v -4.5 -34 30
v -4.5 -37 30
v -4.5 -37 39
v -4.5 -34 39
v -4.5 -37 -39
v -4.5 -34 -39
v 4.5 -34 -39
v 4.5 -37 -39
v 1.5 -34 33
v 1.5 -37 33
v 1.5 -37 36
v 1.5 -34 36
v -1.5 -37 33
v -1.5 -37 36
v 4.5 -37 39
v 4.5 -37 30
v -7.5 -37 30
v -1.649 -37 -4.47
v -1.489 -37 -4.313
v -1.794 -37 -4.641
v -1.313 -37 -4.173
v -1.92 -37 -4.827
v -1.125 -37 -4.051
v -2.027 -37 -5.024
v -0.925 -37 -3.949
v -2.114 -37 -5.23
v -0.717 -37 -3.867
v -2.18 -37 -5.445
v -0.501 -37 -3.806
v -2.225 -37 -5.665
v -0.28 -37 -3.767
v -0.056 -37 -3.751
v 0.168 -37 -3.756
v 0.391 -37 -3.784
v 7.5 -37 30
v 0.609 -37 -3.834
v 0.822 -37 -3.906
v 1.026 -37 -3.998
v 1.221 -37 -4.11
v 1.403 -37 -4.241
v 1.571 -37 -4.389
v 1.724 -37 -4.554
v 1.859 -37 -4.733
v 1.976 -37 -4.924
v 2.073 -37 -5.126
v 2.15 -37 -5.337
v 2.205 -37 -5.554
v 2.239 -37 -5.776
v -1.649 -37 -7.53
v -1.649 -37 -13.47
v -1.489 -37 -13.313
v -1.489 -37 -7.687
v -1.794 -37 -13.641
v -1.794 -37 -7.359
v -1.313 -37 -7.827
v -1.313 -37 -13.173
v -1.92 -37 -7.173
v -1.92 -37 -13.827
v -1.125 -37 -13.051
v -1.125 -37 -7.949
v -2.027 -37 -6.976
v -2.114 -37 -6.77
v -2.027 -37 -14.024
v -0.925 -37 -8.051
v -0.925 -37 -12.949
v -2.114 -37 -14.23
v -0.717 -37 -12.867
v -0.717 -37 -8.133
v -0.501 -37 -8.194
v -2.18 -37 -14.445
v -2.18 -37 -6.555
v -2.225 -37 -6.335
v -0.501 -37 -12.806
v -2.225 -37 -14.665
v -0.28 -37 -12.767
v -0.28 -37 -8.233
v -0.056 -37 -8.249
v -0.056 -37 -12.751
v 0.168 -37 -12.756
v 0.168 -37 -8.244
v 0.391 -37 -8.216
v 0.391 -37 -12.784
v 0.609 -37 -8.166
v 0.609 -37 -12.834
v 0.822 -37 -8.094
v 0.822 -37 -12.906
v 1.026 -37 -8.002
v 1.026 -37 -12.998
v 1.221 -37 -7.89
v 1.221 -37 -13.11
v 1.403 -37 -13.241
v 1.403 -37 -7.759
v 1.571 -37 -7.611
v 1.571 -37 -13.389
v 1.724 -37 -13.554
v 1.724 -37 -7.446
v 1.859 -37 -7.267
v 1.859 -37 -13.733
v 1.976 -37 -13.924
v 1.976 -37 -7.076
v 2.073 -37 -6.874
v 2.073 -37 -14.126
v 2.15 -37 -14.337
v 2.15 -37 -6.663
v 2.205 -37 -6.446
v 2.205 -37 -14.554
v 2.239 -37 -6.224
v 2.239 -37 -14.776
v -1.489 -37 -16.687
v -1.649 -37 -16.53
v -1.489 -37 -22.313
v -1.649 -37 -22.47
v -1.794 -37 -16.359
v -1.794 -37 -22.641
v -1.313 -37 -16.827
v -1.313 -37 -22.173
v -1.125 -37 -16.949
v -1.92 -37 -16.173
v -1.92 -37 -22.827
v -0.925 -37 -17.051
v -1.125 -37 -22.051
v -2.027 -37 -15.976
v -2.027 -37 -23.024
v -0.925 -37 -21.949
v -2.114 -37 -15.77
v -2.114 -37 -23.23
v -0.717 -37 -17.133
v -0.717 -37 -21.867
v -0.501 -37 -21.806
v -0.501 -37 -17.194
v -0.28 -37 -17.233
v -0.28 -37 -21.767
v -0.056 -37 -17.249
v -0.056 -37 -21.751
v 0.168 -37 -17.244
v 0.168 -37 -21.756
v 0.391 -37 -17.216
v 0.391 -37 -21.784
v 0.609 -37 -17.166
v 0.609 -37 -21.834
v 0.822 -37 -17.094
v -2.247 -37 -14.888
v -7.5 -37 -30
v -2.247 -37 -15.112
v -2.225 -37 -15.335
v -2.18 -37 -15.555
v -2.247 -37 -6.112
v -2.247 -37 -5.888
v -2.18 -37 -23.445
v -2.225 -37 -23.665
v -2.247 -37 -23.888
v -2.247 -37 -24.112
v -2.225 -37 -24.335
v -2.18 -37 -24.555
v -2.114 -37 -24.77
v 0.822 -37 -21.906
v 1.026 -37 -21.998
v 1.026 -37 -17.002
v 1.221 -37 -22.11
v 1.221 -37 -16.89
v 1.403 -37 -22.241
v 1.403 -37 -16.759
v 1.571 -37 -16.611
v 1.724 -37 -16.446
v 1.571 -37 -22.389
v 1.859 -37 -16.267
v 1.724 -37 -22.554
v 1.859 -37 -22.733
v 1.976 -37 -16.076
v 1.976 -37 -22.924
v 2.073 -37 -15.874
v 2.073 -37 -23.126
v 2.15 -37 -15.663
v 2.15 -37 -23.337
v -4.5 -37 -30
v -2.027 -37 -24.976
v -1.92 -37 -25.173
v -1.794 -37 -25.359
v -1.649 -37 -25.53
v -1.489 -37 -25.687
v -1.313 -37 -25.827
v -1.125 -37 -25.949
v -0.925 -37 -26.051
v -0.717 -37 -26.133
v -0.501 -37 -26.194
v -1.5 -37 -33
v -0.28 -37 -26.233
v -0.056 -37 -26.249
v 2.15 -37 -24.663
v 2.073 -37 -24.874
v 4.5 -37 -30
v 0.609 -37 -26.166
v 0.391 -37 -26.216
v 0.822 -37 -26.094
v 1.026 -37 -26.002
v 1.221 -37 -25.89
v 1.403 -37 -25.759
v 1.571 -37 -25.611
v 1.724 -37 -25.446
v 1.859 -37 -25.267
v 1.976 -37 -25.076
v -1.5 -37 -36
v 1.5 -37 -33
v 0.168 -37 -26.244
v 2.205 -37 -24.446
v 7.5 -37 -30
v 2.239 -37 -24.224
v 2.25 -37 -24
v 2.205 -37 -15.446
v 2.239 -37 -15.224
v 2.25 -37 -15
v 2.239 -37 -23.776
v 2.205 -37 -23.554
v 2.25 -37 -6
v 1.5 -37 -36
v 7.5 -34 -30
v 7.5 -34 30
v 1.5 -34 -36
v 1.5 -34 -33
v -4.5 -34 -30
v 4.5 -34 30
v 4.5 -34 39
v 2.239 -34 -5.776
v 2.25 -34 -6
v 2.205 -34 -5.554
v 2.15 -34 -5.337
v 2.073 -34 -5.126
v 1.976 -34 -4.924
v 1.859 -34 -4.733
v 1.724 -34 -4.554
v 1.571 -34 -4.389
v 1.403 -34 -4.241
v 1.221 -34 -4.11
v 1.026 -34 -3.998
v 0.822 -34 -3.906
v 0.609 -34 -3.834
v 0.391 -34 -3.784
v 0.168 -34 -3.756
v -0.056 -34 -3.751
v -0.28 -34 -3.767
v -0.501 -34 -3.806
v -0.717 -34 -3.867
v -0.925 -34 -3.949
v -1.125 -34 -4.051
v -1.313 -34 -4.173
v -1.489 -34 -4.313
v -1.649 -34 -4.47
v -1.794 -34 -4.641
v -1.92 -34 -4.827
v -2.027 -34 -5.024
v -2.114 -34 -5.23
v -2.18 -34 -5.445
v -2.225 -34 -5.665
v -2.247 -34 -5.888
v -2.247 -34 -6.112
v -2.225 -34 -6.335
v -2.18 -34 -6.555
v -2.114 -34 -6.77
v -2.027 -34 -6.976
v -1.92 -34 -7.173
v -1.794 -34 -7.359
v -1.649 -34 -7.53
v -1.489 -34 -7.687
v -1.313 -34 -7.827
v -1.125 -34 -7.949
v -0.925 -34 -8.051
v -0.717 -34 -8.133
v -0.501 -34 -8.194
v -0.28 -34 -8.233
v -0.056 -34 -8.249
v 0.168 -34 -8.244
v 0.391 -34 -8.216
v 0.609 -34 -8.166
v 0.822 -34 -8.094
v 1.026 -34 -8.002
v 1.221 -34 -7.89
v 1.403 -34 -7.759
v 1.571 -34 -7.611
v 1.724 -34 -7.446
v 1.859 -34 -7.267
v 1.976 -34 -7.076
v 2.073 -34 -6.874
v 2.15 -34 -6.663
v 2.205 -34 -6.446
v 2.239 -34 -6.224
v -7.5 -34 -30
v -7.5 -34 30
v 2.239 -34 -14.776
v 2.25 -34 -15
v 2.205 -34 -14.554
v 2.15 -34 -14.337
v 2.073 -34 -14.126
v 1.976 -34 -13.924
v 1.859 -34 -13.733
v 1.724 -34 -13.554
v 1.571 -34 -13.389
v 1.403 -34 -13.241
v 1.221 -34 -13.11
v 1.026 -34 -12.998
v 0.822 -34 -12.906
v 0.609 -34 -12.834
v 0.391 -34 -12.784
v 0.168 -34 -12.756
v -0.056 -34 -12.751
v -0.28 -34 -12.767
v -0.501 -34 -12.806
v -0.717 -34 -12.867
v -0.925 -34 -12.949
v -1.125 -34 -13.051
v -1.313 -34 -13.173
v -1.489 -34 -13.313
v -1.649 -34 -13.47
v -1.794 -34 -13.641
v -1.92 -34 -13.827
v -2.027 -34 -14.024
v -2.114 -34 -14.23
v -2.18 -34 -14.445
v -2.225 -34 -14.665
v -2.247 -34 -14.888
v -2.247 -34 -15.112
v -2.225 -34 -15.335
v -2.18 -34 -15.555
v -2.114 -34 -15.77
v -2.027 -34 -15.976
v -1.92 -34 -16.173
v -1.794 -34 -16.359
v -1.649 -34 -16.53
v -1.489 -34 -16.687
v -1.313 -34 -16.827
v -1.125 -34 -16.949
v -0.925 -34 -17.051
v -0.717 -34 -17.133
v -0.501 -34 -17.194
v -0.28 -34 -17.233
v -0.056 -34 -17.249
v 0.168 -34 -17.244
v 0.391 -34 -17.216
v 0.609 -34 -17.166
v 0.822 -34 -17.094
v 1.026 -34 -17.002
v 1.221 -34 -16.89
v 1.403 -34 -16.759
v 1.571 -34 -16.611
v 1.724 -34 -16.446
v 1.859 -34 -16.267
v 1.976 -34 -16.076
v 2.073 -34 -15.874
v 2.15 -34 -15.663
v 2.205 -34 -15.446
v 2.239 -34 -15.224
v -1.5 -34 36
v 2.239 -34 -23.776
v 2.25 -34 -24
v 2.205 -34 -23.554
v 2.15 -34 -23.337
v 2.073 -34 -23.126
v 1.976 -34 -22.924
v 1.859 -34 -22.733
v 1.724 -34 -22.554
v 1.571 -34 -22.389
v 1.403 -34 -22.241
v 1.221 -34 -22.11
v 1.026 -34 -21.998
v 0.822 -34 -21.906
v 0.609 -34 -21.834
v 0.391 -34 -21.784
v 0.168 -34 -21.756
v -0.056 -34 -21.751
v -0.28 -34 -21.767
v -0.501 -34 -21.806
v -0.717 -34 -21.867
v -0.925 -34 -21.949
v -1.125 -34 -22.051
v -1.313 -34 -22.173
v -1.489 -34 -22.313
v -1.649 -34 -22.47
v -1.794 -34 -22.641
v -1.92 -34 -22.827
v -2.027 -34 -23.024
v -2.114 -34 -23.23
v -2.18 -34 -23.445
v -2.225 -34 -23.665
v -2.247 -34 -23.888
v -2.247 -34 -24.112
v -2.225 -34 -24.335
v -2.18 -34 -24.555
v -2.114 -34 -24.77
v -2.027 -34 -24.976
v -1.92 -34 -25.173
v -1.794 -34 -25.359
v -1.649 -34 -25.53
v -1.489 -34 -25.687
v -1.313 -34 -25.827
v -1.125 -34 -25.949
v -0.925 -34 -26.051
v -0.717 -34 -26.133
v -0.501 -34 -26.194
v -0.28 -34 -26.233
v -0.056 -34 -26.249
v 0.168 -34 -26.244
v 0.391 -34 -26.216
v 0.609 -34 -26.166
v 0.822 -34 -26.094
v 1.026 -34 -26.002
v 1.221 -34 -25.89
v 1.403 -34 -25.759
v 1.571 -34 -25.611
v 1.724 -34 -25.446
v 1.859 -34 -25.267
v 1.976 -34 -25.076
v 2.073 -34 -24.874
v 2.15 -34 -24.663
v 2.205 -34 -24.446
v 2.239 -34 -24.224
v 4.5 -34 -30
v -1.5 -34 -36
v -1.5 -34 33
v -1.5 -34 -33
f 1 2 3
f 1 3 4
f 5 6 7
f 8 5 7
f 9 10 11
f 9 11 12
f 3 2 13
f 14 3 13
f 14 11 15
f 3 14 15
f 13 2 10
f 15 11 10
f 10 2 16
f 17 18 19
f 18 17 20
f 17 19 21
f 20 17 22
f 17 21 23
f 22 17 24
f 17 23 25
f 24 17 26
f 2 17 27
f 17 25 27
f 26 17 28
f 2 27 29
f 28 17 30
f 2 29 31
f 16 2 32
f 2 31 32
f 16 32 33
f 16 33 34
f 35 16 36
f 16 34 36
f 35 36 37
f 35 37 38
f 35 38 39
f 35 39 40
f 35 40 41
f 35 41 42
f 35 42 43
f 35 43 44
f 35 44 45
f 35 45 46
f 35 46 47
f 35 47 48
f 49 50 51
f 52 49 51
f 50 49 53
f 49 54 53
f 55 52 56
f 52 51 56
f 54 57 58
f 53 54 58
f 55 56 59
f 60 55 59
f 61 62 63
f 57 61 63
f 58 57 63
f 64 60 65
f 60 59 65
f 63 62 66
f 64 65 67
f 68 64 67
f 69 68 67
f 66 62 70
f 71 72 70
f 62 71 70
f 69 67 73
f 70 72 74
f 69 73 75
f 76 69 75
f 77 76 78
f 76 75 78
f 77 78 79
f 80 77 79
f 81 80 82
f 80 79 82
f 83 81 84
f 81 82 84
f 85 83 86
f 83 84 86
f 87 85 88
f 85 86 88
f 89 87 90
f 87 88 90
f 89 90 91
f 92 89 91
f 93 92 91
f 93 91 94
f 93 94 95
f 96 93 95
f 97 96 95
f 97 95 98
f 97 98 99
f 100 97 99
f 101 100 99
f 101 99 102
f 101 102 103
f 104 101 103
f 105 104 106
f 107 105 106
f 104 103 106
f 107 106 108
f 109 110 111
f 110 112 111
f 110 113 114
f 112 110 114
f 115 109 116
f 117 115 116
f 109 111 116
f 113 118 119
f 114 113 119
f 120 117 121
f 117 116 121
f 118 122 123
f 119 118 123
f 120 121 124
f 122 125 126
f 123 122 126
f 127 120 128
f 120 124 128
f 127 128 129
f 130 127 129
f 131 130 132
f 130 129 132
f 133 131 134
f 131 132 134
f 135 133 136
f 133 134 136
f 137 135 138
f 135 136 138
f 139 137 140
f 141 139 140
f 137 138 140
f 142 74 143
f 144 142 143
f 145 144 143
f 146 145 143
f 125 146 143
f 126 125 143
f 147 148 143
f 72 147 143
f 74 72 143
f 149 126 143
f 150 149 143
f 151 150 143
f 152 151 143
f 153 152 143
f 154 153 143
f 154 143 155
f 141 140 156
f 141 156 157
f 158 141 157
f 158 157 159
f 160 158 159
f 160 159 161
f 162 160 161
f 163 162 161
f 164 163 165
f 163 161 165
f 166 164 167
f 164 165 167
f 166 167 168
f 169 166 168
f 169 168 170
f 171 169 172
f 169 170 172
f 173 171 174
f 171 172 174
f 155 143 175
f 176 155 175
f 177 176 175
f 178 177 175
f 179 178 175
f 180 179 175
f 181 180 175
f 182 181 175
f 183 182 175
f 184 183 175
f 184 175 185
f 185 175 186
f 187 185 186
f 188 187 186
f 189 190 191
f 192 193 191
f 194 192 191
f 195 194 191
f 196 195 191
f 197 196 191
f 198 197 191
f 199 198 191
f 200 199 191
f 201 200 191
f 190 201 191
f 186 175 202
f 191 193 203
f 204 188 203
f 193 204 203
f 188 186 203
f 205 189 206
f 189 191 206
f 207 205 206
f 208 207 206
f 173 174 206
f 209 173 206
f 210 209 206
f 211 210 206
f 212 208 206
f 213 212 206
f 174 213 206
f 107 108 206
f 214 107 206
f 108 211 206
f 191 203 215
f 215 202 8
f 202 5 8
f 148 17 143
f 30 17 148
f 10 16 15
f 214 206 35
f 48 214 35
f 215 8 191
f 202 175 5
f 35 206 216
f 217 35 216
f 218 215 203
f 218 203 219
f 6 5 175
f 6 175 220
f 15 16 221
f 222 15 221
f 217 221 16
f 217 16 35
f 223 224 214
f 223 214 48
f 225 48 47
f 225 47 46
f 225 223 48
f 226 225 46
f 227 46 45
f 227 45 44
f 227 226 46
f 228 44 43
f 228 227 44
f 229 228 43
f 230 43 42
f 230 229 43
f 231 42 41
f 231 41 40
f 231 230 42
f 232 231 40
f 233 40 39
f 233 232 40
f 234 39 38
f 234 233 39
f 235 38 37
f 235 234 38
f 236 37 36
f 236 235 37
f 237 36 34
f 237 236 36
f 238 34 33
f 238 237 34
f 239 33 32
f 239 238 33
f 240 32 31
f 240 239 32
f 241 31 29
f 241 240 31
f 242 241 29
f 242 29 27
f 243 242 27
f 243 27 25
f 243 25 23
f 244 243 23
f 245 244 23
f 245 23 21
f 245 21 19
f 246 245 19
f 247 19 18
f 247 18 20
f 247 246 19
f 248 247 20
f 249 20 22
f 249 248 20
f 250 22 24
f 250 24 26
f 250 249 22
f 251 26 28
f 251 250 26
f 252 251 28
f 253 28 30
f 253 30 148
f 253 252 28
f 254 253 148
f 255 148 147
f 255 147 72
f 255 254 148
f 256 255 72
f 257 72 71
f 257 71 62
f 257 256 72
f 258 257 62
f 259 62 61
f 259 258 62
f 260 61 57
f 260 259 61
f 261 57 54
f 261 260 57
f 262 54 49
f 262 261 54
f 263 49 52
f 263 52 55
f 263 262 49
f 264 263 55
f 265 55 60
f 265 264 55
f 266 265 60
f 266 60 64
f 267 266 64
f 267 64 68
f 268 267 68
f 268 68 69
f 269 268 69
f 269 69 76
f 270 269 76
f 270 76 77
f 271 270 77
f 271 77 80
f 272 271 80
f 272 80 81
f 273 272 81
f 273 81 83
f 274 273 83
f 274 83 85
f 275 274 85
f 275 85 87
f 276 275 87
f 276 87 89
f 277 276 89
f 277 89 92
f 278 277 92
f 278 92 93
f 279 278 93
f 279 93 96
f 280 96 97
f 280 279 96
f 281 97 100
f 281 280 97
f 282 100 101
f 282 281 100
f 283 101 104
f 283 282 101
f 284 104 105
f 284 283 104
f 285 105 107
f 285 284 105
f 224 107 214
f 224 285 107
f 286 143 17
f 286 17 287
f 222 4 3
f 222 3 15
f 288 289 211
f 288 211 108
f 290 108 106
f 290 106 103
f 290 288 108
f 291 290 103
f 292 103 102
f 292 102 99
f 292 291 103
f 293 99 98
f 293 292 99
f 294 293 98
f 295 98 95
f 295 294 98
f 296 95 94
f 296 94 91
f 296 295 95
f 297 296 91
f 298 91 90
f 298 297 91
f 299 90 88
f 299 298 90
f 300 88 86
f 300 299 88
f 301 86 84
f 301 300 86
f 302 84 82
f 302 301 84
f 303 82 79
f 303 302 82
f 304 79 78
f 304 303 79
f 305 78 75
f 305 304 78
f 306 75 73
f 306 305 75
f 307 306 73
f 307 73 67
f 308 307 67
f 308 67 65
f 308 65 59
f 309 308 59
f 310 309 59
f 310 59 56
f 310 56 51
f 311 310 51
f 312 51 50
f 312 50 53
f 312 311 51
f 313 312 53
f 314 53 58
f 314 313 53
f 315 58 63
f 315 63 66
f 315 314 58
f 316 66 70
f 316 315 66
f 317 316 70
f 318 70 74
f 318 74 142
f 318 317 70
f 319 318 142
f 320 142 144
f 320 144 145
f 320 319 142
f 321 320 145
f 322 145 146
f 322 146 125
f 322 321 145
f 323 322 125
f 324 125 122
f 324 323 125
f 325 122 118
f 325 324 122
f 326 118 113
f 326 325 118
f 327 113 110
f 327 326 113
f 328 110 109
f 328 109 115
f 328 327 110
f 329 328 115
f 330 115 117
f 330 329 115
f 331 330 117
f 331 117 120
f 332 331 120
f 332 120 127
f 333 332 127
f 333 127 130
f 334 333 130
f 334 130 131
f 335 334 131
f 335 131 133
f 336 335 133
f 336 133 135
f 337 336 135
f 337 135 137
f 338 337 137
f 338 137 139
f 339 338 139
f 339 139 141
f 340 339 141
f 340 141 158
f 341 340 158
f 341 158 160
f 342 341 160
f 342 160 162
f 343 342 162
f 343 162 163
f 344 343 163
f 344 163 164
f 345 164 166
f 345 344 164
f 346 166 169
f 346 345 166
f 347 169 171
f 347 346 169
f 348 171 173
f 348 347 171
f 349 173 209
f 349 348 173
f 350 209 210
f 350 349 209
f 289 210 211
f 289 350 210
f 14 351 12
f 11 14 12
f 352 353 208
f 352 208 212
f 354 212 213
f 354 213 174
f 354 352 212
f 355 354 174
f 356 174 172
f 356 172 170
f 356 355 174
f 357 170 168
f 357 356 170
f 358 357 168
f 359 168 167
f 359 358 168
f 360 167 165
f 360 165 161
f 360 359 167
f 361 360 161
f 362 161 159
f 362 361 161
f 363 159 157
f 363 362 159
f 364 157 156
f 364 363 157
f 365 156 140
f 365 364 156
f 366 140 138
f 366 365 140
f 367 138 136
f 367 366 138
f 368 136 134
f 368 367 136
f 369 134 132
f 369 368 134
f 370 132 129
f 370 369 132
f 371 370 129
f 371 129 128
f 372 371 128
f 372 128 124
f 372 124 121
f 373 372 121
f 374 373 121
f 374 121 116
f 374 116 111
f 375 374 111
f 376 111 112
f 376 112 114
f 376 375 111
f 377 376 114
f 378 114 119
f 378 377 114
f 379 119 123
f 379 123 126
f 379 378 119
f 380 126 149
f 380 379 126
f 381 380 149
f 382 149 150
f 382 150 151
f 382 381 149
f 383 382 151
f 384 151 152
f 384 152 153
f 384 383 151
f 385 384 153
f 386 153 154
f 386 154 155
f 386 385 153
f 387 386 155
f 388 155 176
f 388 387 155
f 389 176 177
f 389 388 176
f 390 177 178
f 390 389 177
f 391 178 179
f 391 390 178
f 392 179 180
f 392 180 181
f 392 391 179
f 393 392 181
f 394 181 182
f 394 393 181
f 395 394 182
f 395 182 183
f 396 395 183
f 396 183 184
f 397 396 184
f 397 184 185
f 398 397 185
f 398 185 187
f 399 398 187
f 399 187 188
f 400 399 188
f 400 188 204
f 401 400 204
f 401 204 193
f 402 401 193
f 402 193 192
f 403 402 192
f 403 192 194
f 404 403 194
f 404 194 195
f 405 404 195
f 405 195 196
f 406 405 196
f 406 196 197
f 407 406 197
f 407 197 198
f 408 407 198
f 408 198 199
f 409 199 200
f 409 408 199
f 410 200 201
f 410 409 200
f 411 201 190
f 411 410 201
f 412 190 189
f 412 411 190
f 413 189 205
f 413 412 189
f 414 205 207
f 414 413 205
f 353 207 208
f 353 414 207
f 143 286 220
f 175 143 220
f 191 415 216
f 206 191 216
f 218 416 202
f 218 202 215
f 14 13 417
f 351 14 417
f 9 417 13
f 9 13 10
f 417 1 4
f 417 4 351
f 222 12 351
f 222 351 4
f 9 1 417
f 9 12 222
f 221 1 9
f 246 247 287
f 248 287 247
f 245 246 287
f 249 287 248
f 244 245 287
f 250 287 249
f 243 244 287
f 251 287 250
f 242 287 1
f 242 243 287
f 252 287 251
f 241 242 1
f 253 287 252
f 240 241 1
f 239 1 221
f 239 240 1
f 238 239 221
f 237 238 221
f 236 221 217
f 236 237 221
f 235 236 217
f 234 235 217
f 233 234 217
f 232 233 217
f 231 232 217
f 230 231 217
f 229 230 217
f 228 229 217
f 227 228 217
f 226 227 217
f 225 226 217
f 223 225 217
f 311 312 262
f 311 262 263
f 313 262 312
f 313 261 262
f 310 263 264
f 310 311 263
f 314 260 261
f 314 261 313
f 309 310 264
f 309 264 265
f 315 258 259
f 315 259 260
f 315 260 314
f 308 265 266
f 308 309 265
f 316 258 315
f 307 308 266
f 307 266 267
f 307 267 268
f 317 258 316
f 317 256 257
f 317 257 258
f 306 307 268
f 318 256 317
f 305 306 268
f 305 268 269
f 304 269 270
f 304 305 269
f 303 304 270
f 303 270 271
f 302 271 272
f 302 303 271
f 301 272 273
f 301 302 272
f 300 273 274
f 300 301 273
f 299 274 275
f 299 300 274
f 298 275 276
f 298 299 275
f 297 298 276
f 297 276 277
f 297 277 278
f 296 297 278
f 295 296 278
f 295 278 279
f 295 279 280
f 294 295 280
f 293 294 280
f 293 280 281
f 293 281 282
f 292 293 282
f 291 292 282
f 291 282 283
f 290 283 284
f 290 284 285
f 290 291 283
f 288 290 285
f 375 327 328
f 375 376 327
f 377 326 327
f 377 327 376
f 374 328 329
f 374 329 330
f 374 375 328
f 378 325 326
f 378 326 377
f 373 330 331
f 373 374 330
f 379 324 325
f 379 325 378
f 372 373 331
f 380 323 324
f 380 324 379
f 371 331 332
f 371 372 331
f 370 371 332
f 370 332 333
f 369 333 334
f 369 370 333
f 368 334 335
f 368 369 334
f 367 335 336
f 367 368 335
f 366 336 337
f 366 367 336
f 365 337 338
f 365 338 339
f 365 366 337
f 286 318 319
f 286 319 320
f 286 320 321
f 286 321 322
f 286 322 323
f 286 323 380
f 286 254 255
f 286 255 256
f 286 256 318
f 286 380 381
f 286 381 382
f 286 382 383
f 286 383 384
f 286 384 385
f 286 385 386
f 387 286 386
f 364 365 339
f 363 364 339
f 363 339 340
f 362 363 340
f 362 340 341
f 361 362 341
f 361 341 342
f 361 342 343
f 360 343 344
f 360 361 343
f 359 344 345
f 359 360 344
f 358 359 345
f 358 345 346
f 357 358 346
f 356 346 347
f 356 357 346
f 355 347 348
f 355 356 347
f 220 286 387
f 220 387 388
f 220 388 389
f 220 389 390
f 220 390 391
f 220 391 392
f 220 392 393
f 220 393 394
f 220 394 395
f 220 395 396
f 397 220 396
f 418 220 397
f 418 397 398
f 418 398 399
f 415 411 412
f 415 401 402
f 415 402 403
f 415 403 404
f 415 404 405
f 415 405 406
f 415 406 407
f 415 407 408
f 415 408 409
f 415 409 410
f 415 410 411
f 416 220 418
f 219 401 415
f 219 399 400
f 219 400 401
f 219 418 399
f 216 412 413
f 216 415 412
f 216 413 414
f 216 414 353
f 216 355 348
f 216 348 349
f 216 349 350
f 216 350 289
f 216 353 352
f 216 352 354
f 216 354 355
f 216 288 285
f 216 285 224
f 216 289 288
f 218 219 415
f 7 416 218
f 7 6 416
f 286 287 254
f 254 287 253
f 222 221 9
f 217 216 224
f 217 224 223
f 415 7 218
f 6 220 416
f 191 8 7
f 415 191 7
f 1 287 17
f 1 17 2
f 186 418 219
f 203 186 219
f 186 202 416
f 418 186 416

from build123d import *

# Parameters (mm, degrees)
CYLINDER005_R          = 2.25
CYLINDER005_DEPTH      = 3
CYLINDER005_ROLL_ANGLE = 90
CYLINDER006_R          = 2.25
CYLINDER006_DEPTH      = 3
CYLINDER006_ROLL_ANGLE = 90
CYLINDER004_R          = 2.25
CYLINDER004_DEPTH      = 3
CYLINDER004_ROLL_ANGLE = 90
BOX011_W               = 15
BOX011_H               = 3
BOX011_DEPTH           = 60
BOX010_W               = 3
BOX010_H               = 3
BOX010_DEPTH           = 3
BOX009_W               = 9
BOX009_H               = 3
BOX009_DEPTH           = 9
BOX013_W               = 3
BOX013_H               = 3
BOX013_DEPTH           = 3
BOX012_W               = 9
BOX012_H               = 3
BOX012_DEPTH           = 9


with BuildPart() as cylinder005:
    # Cylinder005 → Cylinder005 (new body)
    with BuildSketch(Plane.XY):
        Circle(CYLINDER005_R)
    extrude(amount=CYLINDER005_DEPTH)


with BuildPart() as cylinder005_1:
    # Cylinder005 roll: moved
    add(cylinder005.part.rotate(Axis((0, 0, 0), (1, 0, 0)), CYLINDER005_ROLL_ANGLE))


with BuildPart() as cylinder005_2:
    # Cylinder005 placement: moved
    add(cylinder005_1.part.moved(Location((0, -63, -3))))


with BuildPart() as cylinder006:
    # Cylinder006 → Cylinder006 (new body)
    with BuildSketch(Plane.XY):
        Circle(CYLINDER006_R)
    extrude(amount=CYLINDER006_DEPTH)


with BuildPart() as cylinder006_1:
    # Cylinder006 roll: moved
    add(cylinder006.part.rotate(Axis((0, 0, 0), (1, 0, 0)), CYLINDER006_ROLL_ANGLE))


with BuildPart() as cylinder006_2:
    # Cylinder006 placement: moved
    add(cylinder006_1.part.moved(Location((0, -63, -21))))


with BuildPart() as cylinder004:
    # Cylinder004 → Cylinder004 (new body)
    with BuildSketch(Plane.XY):
        Circle(CYLINDER004_R)
    extrude(amount=CYLINDER004_DEPTH)


with BuildPart() as cylinder004_1:
    # Cylinder004 roll: moved
    add(cylinder004.part.rotate(Axis((0, 0, 0), (1, 0, 0)), CYLINDER004_ROLL_ANGLE))


with BuildPart() as cylinder004_2:
    # Cylinder004 placement: moved
    add(cylinder004_1.part.moved(Location((0, -63, -12))))


with BuildPart() as cube011:
    # Box011 → Box011 (new body)
    with BuildSketch(Plane(origin=(-7.5, -66, -27), x_dir=(1, 0, 0), z_dir=(0, 0, 1))):
        with Locations((7.5, 1.5)):
            Rectangle(BOX011_W, BOX011_H)
    extrude(amount=BOX011_DEPTH)


with BuildPart() as cube010:
    # Box010 → Box010 (new body)
    with BuildSketch(Plane(origin=(-1.5, -66, 6), x_dir=(1, 0, 0), z_dir=(0, 0, 1))):
        with Locations((1.5, 1.5)):
            Rectangle(BOX010_W, BOX010_H)
    extrude(amount=BOX010_DEPTH)


with BuildPart() as cut010:
    # Box009 → Box009 (new body)
    with BuildSketch(Plane(origin=(-4.5, -66, 3), x_dir=(1, 0, 0), z_dir=(0, 0, 1))):
        with Locations((4.5, 1.5)):
            Rectangle(BOX009_W, BOX009_H)
    extrude(amount=BOX009_DEPTH)

    # Cut010: cut Cube010
    add(cube010.part, mode=Mode.SUBTRACT)


with BuildPart() as cut010_1:
    # Cut010 placement: moved
    add(cut010.part.moved(Location((0, 0, 30))))


with BuildPart() as cube013:
    # Box013 → Box013 (new body)
    with BuildSketch(Plane(origin=(-1.5, -66, 6), x_dir=(1, 0, 0), z_dir=(0, 0, 1))):
        with Locations((1.5, 1.5)):
            Rectangle(BOX013_W, BOX013_H)
    extrude(amount=BOX013_DEPTH)


with BuildPart() as pitchringconnector:
    # Box012 → Box012 (new body)
    with BuildSketch(Plane(origin=(-4.5, -66, 3), x_dir=(1, 0, 0), z_dir=(0, 0, 1))):
        with Locations((4.5, 1.5)):
            Rectangle(BOX012_W, BOX012_H)
    extrude(amount=BOX012_DEPTH)

    # Cut011: cut Cube013
    add(cube013.part, mode=Mode.SUBTRACT)


with BuildPart() as pitchringconnector_1:
    # Cut011 placement: moved
    add(pitchringconnector.part.moved(Location((0, 0, -39))))

    # Fusion: union Cube011, Cut010
    add(cube011.part)
    add(cut010_1.part)

    # Cut012: cut Cylinder004
    add(cylinder004_2.part, mode=Mode.SUBTRACT)

    # Cut013: cut Cylinder006
    add(cylinder006_2.part, mode=Mode.SUBTRACT)

    # Cut014: cut Cylinder005
    add(cylinder005_2.part, mode=Mode.SUBTRACT)


with BuildPart() as pitchringconnector_2:
    # Cut014 placement: moved
    add(pitchringconnector_1.part.moved(Location((0, 29, -3))))


solid = pitchringconnector_2.part
